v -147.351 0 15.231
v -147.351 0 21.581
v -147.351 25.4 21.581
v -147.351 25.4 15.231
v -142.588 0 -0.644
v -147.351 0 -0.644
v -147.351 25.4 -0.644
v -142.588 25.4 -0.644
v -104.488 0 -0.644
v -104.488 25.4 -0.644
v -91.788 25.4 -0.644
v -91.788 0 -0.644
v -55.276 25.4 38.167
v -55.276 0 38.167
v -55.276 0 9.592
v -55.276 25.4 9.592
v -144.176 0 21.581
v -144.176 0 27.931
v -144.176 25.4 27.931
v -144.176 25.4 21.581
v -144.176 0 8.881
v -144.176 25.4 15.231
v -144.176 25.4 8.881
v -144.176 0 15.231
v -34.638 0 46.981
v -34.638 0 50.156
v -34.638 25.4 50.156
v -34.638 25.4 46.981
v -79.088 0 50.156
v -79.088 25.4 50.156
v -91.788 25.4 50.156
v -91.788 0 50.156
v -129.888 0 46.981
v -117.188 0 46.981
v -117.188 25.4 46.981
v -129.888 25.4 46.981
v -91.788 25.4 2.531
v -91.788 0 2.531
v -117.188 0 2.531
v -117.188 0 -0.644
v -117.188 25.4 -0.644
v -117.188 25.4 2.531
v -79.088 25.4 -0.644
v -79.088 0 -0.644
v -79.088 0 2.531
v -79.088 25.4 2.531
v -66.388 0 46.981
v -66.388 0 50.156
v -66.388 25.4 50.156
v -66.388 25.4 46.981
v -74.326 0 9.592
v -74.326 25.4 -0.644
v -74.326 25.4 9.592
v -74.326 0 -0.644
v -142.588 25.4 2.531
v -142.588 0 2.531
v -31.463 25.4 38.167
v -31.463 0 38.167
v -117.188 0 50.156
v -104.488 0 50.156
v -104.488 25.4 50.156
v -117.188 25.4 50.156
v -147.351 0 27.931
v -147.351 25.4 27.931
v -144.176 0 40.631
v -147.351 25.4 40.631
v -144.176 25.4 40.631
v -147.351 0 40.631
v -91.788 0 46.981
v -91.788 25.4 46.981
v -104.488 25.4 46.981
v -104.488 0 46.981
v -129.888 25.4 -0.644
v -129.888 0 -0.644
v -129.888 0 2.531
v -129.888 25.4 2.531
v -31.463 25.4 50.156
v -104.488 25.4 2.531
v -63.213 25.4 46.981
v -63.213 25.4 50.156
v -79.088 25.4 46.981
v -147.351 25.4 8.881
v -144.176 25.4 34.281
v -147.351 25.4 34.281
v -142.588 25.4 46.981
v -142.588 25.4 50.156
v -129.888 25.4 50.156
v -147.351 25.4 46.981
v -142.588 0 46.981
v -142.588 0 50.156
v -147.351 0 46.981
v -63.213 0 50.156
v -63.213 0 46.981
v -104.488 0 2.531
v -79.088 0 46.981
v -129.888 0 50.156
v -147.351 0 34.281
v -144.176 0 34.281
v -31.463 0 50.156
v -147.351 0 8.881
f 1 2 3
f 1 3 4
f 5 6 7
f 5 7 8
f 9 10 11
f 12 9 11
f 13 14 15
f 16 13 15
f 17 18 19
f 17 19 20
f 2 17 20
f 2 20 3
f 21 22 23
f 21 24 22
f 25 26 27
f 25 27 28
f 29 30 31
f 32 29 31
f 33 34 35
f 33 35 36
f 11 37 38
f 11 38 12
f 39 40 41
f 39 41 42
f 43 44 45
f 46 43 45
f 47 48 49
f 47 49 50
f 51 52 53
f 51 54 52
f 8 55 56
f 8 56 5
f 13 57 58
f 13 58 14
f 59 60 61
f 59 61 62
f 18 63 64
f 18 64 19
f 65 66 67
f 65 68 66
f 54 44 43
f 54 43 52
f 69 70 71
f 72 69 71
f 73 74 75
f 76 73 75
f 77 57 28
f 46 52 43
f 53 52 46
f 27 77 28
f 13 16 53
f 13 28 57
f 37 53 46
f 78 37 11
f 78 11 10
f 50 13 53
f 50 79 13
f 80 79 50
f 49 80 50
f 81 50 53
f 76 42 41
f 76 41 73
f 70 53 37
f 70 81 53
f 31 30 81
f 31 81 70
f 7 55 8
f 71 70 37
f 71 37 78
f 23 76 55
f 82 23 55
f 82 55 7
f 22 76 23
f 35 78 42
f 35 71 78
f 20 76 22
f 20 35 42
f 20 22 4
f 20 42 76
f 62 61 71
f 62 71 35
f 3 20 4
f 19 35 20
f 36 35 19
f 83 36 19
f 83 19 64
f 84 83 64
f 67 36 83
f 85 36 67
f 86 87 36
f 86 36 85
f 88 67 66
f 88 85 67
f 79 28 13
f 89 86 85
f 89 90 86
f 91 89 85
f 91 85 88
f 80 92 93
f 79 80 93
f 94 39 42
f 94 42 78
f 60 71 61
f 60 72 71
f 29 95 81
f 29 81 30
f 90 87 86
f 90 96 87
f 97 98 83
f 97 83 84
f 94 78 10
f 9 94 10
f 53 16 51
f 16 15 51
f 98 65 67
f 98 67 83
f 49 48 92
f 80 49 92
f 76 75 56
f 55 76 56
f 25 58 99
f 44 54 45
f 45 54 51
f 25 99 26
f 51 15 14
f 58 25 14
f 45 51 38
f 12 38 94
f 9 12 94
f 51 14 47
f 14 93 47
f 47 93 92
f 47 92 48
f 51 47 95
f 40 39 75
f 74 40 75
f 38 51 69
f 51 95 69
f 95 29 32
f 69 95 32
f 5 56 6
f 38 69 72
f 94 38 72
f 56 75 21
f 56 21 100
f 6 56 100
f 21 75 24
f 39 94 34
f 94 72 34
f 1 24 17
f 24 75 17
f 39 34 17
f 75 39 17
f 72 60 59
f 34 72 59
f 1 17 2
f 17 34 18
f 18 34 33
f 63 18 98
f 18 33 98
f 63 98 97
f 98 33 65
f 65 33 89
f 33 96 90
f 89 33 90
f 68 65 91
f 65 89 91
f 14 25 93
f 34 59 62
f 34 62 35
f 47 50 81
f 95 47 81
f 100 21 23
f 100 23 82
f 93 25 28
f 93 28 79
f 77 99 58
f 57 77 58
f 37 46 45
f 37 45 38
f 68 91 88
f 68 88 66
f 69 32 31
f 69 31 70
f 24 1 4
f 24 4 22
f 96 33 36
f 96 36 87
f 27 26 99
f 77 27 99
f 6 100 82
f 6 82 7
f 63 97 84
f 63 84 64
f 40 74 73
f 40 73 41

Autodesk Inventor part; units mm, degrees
ref_plane "YZ Plane" through (0, 0, 0) normal (1, 0, 0) x (0, 1, 0)
ref_plane "XZ Plane" through (0, 0, 0) normal (0, 1, 0) x (-1, 0, 0)
ref_plane "XY Plane" through (0, 0, 0) normal (0, 0, 1) x (1, 0, 0)
sketch "Sketch1" plane through (0, 0, 0) normal (0, 1, 0) x (-1, 0, 0)
  line L0 (147.3507, -0.6443) -> (74.3257, -0.6443)
  line L1 (74.3257, -0.6443) -> (74.3257, 50.1557)
  line L2 (74.3257, 50.1557) -> (147.3507, 50.1557)
  line L3 (147.3507, 50.1557) -> (147.3507, -0.6443)
  line L4 (147.3507, 50.1557) -> (142.5882, 50.1557)
  line L5 (142.5882, 50.1557) -> (142.5882, 46.9807)
  line L6 (142.5882, 46.9807) -> (147.3507, 46.9807)
  line L7 (147.3507, 46.9807) -> (147.3507, 50.1557)
  line L8 (129.8882, 50.1557) -> (117.1882, 50.1557)
  line L9 (117.1882, 50.1557) -> (117.1882, 46.9807)
  line L10 (117.1882, 46.9807) -> (129.8882, 46.9807)
  line L11 (129.8882, 46.9807) -> (129.8882, 50.1557)
  line L12 (104.4882, 50.1557) -> (91.7882, 50.1557)
  line L13 (91.7882, 50.1557) -> (91.7882, 46.9807)
  line L14 (91.7882, 46.9807) -> (104.4882, 46.9807)
  line L15 (104.4882, 46.9807) -> (104.4882, 50.1557)
  line L16 (147.3507, 2.5307) -> (147.3507, -0.6443)
  line L17 (129.8882, -0.6443) -> (117.1882, -0.6443)
  line L18 (104.4882, -0.6443) -> (91.7882, -0.6443)
  line L19 (147.3507, 8.8807) -> (147.3507, 15.2307)
  line L20 (147.3507, 15.2307) -> (144.1757, 15.2307)
  line L21 (144.1757, 15.2307) -> (144.1757, 8.8807)
  line L22 (144.1757, 8.8807) -> (147.3507, 8.8807)
  line L23 (147.3507, 21.5807) -> (147.3507, 27.9307)
  line L24 (147.3507, 27.9307) -> (144.1757, 27.9307)
  line L25 (144.1757, 27.9307) -> (144.1757, 21.5807)
  line L26 (144.1757, 21.5807) -> (147.3507, 21.5807)
  line L27 (147.3507, 34.2807) -> (147.3507, 40.6307)
  line L28 (147.3507, 40.6307) -> (144.1757, 40.6307)
  line L29 (144.1757, 40.6307) -> (144.1757, 34.2807)
  line L30 (144.1757, 34.2807) -> (147.3507, 34.2807)
  line L31 (74.3257, 46.9807) -> (74.3257, 50.1557)
  line L32 (74.3257, 2.5307) -> (74.3257, -0.6443)
  line L33 (79.0882, -0.6443) -> (79.0882, 2.5307)
  line L34 (79.0882, 2.5307) -> (91.7882, 2.5307)
  line L35 (91.7882, 2.5307) -> (91.7882, -0.6443)
  line L36 (91.7882, -0.6443) -> (79.0882, -0.6443)
  line L37 (104.4882, 2.5307) -> (104.4882, -0.6443)
  line L38 (104.4882, -0.6443) -> (117.1882, -0.6443)
  line L39 (117.1882, -0.6443) -> (117.1882, 2.5307)
  line L40 (117.1882, 2.5307) -> (104.4882, 2.5307)
  line L41 (129.8882, -0.6443) -> (129.8882, 2.5307)
  line L42 (129.8882, 2.5307) -> (142.5882, 2.5307)
  line L43 (142.5882, 2.5307) -> (142.5882, -0.6443)
  line L44 (142.5882, -0.6443) -> (129.8882, -0.6443)
  line L45 (74.3257, 50.1557) -> (74.3257, 18.4057)
  line L46 (74.3257, 46.9807) -> (74.3257, 50.1557)
  line L47 (79.0882, 50.1557) -> (66.3882, 50.1557)
  line L48 (66.3882, 50.1557) -> (66.3882, 46.9807)
  line L49 (66.3882, 46.9807) -> (79.0882, 46.9807)
  line L50 (79.0882, 46.9807) -> (79.0882, 50.1557)
  line L51 (66.3882, 50.1557) -> (63.2132, 50.1557)
  line L52 (63.2132, 50.1557) -> (63.2132, 46.9807)
  line L53 (63.2132, 46.9807) -> (66.3882, 46.9807)
  line L54 (66.3882, 46.9807) -> (66.3882, 50.1557)
  line L55 (63.2132, 50.1557) -> (31.4632, 50.1557)
  line L56 (31.4632, 50.1557) -> (31.4632, 38.1669)
  line L57 (31.4632, 38.1669) -> (63.2132, 38.1669)
  line L58 (63.2132, 38.1669) -> (63.2132, 50.1557)
  line L59 (63.2132, 46.9807) -> (63.2132, 50.1557)
  line L60 (63.2132, 50.1557) -> (31.4632, 50.1557)
  line L61 (31.4632, 50.1557) -> (31.4632, 46.9807)
  line L62 (31.4632, 46.9807) -> (63.2132, 46.9807)
  line L63 (31.4632, 50.1557) -> (34.6382, 50.1557)
  line L64 (34.6382, 50.1557) -> (34.6382, 46.9807)
  line L65 (34.6382, 46.9807) -> (31.4632, 46.9807)
  line L66 (31.4632, 46.9807) -> (31.4632, 50.1557)
  line L67 (74.3257, 46.9807) -> (55.2757, 46.9807)
  line L68 (55.2757, 46.9807) -> (55.2757, 9.5919)
  line L69 (55.2757, 9.5919) -> (74.3257, 9.5919)
  line L70 (74.3257, 9.5919) -> (74.3257, 46.9807)
  point P0 (0, 0)
  point P1 (79.0882, -0.6443)
  point P2 (91.7882, -0.6443)
  point P3 (104.4882, -0.6443)
  point P4 (117.1882, -0.6443)
  point P5 (129.8882, -0.6443)
  point P6 (142.5882, -0.6443)
  point P7 (55.2757, 38.1669)
  dimension "d103" = 73.025
  dimension "d105" = 4.7625
  dimension "d106" = 3.175
  dimension "d107" = 12.7
  dimension "d108" = 3.175
  dimension "d109" = 12.7
  dimension "d110" = 3.175
  dimension "d111" = 12.7
  dimension "d112" = 12.7
  dimension "d121" = 6.35
  dimension "d122" = 3.175
  dimension "d123" = 6.35
  dimension "d124" = 3.175
  dimension "d126" = 6.35
  dimension "d127" = 6.35
  dimension "d128" = 3.175
  dimension "d129" = 6.35
  dimension "d146" = 3.175
  dimension "d147" = 12.7
  dimension "d148" = 0
  dimension "d149" = 4.7625
  dimension "d150" = 3.175
  dimension "d151" = 12.7
  dimension "d152" = 12.7
  dimension "d153" = 0
  dimension "d154" = 3.175
  dimension "d155" = 12.7
  dimension "d156" = 12.7
  dimension "d161" = 0
  dimension "d168" = 12.7
  dimension "d169" = 3.175
  dimension "d170" = 12.7
  dimension "d171" = 3.175
  dimension "d172" = 3.175
  dimension "d182" = 31.75
  dimension "d183" = 11.9888
  dimension "d186" = 3.175
  dimension "d195" = 19.05
  dimension "d196" = 37.3888
extrude "Extrusion15" add sketch "Sketch1" along normal blind 25.4 contours L0 L43 L42 L41 L39 L40 L37 L35 L34 L33 L1 L49 L50 L2 L13 L14 L15 L9 L10 L11 L5 L6 L3 L28 L29 L30 L24 L25 L26 L20 L21 L22 | L69 L68 L57 L58 L53 L49 L1 | L68 L62 L58 L57 | L57 L56 L62 L68 | L53 L52 L51 L48 | L56 L55 L64 L62
equation "\"BendRadius\" = Thickness"
equation "\"BendReliefWidth\" = Thickness"
equation "\"BendReliefDepth\" = 0.5 * Thickness"
equation "\"CornerReliefSize\" = 4 * Thickness"
equation "\"MinimumRemnant\" = 2 * Thickness"
equation "\"TransitionRadius\" = BendRadius"
equation "\"JacobiRadiusSize\" = BendRadius"
equation "\"GapSize\" = Thickness"
equation "\"Thickness\" = 3.048"
properties part number "V9_BURROW_SIDE"
